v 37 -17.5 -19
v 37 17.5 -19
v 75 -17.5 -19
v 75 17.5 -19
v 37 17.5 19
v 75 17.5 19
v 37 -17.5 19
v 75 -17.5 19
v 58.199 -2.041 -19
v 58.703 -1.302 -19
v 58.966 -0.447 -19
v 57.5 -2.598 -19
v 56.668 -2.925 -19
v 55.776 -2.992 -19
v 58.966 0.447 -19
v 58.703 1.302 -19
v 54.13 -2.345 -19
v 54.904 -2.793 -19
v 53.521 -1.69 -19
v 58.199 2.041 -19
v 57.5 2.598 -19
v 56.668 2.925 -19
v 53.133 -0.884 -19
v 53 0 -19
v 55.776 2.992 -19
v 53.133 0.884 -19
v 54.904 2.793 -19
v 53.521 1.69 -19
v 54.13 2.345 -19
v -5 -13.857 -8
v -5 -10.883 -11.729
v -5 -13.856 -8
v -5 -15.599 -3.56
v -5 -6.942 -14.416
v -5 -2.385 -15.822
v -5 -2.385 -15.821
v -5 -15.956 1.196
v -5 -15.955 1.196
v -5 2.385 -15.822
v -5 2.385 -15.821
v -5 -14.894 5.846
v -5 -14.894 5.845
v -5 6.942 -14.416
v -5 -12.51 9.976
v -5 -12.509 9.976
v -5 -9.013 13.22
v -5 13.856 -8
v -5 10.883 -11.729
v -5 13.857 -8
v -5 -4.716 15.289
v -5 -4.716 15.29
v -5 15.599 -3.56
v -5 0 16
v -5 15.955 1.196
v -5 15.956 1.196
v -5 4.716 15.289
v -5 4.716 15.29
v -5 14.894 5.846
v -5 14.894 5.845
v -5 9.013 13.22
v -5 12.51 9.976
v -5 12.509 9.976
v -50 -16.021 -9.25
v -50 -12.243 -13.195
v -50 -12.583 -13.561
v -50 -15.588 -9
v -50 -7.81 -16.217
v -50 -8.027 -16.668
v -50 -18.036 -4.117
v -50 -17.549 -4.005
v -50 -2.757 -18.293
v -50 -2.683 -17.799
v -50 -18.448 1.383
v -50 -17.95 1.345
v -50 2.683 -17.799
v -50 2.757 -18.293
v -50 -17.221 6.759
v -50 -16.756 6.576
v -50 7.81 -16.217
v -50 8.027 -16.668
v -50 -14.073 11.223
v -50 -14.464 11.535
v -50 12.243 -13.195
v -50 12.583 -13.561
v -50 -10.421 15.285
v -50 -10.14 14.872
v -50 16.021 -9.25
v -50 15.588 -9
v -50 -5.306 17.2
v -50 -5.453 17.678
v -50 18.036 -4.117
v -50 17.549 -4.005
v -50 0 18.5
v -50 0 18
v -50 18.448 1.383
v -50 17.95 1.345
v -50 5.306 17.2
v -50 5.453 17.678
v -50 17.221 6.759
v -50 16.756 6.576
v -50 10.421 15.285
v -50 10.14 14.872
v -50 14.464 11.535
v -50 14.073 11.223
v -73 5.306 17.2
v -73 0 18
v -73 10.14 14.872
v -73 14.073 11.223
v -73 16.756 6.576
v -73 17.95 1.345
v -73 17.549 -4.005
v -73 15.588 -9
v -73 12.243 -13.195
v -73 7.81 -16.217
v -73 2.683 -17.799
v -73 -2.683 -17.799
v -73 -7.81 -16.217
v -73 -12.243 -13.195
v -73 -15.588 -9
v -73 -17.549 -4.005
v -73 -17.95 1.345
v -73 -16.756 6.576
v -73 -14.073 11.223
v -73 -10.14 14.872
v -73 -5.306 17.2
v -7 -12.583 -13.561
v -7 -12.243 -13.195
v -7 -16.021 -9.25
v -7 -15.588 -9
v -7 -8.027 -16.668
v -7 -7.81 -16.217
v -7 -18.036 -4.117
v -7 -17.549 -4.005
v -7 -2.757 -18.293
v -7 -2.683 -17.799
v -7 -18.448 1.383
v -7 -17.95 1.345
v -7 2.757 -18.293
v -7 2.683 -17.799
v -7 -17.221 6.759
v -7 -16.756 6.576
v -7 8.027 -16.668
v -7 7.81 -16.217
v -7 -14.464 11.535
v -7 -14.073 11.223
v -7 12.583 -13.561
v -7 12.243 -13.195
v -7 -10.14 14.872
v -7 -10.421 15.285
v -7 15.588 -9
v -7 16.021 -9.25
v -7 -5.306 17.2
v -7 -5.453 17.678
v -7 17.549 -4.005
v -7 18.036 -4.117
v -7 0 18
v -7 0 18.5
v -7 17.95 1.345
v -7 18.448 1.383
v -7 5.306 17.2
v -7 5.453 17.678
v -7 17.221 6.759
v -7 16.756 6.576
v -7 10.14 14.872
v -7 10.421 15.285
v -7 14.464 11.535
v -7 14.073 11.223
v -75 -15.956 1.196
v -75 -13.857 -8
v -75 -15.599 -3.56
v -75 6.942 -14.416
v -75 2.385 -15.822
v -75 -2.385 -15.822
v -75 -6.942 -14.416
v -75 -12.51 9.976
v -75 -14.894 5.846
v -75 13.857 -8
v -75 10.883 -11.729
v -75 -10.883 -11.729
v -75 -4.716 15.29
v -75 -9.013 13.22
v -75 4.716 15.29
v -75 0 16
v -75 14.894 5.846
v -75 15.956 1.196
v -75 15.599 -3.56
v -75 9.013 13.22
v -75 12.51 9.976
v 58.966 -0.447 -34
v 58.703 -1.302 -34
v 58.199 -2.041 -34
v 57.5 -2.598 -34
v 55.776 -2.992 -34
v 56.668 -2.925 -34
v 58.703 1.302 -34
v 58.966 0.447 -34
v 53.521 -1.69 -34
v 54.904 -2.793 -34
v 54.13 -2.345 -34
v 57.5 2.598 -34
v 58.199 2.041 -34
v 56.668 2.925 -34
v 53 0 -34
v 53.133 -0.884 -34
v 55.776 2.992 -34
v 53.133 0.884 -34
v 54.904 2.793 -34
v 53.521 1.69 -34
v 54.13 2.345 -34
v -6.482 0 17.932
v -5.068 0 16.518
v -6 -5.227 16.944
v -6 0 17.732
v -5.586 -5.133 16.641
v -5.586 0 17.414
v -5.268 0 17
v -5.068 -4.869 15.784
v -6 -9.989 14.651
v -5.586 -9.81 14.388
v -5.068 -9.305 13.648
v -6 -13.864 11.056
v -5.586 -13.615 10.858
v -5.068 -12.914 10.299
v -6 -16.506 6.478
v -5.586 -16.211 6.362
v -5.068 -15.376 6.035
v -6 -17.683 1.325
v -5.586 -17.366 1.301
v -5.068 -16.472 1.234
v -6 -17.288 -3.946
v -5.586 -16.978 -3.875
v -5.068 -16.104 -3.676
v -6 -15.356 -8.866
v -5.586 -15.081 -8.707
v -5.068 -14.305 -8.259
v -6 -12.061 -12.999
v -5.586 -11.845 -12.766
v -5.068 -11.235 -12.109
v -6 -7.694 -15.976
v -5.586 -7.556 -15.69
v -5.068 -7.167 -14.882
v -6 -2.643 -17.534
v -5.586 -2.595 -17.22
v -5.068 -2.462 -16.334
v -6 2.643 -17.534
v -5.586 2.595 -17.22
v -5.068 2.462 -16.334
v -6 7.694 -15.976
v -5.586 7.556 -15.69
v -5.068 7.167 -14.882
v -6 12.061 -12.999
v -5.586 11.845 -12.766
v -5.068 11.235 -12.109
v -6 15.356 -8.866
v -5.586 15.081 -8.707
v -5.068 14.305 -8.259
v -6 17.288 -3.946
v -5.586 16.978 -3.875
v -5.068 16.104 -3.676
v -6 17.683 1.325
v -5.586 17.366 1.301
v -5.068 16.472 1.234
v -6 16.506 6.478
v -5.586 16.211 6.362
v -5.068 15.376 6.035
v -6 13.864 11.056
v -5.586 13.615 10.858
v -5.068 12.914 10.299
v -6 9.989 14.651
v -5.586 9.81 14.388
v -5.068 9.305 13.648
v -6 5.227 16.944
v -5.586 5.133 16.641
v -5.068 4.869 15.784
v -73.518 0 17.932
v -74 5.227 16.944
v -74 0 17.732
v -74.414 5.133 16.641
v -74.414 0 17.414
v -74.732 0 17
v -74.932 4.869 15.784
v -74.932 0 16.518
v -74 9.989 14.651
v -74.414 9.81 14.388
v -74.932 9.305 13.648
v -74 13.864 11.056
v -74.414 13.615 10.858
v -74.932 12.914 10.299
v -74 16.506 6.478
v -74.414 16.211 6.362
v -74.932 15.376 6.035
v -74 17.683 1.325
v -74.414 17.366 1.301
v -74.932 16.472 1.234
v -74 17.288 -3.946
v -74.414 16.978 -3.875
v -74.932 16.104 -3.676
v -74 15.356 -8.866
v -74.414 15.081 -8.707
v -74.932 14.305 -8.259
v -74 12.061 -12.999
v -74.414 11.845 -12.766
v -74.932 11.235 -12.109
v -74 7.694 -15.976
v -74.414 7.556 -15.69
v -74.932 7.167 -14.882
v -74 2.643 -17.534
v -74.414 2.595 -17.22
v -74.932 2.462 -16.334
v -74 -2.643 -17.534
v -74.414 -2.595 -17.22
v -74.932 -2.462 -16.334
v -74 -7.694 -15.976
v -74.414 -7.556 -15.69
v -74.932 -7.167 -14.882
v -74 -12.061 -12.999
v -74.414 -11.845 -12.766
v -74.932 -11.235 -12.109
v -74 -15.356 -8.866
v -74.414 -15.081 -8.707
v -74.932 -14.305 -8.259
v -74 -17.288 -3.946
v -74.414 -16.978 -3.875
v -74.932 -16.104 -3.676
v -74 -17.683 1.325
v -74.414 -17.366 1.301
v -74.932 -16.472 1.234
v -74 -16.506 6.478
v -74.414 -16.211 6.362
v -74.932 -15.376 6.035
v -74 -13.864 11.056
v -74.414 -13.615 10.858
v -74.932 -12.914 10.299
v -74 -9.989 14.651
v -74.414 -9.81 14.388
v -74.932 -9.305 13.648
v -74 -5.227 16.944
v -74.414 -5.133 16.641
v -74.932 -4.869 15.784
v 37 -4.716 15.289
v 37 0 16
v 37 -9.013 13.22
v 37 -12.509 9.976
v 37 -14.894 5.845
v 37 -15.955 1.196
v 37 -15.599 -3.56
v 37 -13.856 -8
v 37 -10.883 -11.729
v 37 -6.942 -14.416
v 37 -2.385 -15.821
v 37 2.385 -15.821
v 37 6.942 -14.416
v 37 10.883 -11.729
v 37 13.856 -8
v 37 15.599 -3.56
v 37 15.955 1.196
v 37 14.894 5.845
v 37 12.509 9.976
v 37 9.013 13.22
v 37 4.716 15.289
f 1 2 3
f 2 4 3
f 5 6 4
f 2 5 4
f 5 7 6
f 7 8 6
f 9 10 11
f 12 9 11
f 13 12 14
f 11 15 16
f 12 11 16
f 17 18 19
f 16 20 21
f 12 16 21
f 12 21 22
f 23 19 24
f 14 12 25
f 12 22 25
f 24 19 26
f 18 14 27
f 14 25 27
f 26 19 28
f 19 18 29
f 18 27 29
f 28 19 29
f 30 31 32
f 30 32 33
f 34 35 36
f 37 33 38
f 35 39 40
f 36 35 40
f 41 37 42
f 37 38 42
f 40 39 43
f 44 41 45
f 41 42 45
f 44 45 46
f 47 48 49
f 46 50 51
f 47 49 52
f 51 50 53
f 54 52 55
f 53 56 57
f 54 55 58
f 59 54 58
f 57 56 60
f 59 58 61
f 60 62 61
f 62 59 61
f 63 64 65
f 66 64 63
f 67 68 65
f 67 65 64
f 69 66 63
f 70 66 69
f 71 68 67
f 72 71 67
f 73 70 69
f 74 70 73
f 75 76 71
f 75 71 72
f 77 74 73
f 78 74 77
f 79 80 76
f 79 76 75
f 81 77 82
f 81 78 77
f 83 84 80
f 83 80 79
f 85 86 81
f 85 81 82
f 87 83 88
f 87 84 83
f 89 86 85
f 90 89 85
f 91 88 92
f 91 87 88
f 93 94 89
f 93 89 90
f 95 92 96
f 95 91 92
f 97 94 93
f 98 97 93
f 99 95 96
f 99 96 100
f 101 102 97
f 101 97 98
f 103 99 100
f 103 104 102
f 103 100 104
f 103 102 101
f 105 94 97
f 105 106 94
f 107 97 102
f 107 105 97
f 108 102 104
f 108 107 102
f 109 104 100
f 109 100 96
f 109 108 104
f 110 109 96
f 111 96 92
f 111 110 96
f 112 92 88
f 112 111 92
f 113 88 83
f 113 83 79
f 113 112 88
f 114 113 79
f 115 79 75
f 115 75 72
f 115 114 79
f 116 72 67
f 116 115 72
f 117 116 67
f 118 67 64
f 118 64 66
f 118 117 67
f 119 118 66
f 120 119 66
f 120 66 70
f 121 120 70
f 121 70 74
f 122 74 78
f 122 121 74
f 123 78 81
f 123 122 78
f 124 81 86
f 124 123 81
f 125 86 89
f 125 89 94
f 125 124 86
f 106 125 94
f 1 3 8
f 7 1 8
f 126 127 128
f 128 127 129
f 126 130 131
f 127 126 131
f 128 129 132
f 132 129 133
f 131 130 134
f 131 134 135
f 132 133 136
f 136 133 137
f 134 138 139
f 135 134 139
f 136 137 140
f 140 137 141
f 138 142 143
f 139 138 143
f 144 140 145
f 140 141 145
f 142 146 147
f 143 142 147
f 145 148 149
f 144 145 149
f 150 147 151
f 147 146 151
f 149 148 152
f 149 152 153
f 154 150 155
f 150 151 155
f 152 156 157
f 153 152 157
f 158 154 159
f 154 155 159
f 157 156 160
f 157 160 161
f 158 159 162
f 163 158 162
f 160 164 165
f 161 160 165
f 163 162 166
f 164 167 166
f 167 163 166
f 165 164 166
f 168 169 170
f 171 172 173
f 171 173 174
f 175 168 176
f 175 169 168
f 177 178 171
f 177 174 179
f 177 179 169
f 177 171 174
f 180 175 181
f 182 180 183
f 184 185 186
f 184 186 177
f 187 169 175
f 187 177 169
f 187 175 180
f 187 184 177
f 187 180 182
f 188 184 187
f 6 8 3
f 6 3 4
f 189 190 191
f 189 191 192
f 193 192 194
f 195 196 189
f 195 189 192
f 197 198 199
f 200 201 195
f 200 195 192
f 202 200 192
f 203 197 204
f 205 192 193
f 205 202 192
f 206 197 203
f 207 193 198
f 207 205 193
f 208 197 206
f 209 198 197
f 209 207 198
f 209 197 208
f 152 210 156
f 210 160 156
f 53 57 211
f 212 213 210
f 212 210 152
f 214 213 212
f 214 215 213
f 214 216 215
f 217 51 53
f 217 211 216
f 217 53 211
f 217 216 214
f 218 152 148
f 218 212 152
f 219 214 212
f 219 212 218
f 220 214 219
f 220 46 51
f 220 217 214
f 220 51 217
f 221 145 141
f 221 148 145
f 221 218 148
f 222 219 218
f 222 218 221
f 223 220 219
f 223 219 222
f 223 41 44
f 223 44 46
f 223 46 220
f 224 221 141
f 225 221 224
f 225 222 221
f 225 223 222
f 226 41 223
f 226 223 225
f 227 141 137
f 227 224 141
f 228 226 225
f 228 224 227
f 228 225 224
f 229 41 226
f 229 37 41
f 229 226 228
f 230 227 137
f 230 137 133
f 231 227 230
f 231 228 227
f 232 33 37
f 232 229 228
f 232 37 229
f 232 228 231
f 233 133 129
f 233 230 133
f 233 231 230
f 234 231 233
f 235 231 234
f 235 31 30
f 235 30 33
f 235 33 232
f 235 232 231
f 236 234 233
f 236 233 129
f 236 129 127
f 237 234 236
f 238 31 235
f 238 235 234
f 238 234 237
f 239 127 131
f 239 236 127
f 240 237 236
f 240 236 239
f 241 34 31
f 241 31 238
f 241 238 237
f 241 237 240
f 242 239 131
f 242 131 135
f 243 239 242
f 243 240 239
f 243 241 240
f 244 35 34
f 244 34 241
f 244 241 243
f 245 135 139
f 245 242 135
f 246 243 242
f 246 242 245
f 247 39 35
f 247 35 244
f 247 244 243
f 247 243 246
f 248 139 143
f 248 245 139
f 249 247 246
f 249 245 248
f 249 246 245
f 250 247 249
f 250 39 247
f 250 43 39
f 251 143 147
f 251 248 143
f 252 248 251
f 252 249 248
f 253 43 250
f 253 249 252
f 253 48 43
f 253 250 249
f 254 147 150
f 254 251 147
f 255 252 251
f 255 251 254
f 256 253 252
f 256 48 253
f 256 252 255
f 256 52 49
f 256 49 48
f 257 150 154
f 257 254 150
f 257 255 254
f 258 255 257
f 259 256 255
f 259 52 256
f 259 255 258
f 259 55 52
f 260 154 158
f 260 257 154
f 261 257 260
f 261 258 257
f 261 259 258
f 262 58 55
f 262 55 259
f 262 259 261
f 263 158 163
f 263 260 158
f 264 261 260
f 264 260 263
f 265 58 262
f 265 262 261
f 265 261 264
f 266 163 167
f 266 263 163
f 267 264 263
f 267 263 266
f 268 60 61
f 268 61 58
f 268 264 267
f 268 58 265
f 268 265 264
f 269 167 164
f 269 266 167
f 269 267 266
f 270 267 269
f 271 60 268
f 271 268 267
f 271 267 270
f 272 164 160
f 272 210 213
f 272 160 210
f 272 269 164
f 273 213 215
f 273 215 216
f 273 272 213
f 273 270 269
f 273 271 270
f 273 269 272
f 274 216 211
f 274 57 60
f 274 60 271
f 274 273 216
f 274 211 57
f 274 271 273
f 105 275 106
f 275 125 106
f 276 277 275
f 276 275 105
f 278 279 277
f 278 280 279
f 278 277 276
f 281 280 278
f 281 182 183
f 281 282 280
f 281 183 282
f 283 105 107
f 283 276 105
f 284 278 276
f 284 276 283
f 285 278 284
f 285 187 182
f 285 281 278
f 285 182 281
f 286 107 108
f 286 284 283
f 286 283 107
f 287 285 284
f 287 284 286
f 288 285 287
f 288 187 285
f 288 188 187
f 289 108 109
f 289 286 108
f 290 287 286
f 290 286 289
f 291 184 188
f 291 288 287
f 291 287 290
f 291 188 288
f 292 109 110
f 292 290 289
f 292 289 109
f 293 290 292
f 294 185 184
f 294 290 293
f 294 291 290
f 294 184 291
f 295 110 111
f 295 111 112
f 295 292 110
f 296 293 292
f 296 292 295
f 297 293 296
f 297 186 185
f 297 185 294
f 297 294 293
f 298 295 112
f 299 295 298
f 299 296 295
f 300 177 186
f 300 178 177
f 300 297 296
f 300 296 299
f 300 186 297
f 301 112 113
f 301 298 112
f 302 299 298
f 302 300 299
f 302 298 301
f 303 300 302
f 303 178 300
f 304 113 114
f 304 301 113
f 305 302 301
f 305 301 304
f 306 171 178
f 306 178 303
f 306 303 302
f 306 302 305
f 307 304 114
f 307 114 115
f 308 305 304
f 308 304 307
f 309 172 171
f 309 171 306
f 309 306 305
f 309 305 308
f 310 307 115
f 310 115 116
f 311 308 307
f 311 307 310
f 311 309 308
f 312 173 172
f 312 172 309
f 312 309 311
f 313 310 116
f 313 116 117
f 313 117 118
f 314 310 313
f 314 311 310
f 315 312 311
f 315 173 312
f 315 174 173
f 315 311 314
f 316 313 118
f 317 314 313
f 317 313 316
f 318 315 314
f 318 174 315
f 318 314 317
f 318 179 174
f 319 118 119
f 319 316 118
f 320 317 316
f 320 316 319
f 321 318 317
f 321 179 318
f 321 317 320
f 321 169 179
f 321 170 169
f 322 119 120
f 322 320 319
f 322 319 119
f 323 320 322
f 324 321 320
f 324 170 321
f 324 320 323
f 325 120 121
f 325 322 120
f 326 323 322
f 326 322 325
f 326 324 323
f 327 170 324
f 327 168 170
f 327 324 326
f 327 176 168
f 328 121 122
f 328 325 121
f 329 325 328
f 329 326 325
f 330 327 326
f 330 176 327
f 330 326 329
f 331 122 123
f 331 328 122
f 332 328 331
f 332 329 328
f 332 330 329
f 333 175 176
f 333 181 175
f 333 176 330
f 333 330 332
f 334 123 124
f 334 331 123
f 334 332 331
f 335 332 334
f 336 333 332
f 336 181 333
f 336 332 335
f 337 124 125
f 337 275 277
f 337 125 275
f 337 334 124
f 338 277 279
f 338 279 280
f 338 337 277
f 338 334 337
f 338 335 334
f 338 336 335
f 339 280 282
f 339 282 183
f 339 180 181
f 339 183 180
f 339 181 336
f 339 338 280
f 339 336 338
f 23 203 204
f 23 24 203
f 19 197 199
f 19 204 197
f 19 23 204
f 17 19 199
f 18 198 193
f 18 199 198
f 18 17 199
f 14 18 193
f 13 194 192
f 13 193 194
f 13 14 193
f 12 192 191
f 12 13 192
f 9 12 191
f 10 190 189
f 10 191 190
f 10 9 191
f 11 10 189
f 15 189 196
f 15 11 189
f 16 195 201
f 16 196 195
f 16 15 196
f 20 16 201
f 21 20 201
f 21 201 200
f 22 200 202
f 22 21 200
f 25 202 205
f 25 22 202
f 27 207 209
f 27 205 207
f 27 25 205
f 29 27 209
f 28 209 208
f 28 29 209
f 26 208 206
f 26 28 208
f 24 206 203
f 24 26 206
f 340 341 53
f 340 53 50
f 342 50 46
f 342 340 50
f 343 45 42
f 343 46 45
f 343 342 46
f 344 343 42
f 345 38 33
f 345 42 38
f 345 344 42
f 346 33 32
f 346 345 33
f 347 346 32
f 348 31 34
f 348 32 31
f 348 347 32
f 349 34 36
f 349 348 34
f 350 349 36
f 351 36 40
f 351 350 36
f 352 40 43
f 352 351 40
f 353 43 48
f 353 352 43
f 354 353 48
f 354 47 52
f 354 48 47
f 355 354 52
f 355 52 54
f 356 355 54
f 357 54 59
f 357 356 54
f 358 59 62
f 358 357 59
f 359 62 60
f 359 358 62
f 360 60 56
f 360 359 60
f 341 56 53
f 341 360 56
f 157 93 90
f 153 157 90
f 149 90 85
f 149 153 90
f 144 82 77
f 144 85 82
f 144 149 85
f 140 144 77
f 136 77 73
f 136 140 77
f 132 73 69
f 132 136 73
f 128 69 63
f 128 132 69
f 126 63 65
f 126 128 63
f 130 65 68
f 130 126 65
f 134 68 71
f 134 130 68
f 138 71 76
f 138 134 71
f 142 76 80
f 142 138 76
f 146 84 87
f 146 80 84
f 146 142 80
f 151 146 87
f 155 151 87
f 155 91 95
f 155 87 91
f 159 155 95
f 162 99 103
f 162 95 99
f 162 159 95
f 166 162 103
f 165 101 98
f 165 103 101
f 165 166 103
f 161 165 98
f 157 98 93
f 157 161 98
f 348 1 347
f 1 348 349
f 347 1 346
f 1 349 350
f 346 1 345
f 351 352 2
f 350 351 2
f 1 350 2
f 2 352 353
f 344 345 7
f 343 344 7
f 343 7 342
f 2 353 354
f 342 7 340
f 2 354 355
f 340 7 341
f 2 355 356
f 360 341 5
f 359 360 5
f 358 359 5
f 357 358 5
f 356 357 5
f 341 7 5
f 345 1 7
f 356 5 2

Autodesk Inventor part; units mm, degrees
ref_plane "YZ Plane" through (0, 0, 0) normal (1, 0, 0) x (0, 1, 0)
ref_plane "XZ Plane" through (0, 0, 0) normal (0, 1, 0) x (-1, 0, 0)
sketch "Sketch1" plane through (0, 0, 0) normal (0, 0, 1) x (1, 0, 0)
  line L0 (-75, 0) -> (75, 0)
  line L1 (-105, 0) -> (105, 0) projected
  point P0 (0, 0)
  dimension "d0" = 150
  dimension "d1" = 75
ref_plane "Work Plane1" through (75, 0, 0) normal (1, 0, 0) x (0, 1, 0)
sketch "Sketch2" plane through (75, 0, 0) normal (1, 0, 0) x (0, 1, 0)
  line L0 (-17.5, 19) -> (17.5, 19)
  line L1 (17.5, 19) -> (17.5, -19)
  line L2 (17.5, -19) -> (-17.5, -19)
  line L3 (-17.5, -19) -> (-17.5, 19)
  line L4 (-17.5, 19) -> (17.5, -19) construction
  line L5 (17.5, 19) -> (-17.5, -19) construction
  point P0 (0, 0)
  dimension "d2" = 35
  dimension "d3" = 38
extrude "Extrusion1" add sketch "Sketch2" against normal blind 38
sketch "Sketch3" plane through (37, 0, 0) normal (-1, 0, 0) x (0, 0, 1)
  circle A0 centre (0, 0) radius 16
  dimension "d6" = 32
extrude "Extrusion2" add sketch "Sketch3" along normal blind 42
sketch "Sketch4" plane through (-5, 0, 0) normal (-1, 0, 0) x (0, 0, 1)
  circle A0 centre (0, 0) radius 18
  dimension "d9" = 36
extrude "Extrusion3" add sketch "Sketch4" along normal blind 2
sketch "Sketch5" plane through (-7, 0, 0) normal (-1, 0, 0) x (0, 0, 1)
  circle A0 centre (0, 0) radius 18.5
  dimension "d12" = 37
extrude "Extrusion4" add sketch "Sketch5" along normal blind 68
sketch "Sketch6" plane through (-75, 0, 0) normal (-1, 0, 0) x (0, 0, 1)
  circle A0 centre (0, 0) radius 18
  circle A1 centre (0, 0) radius 18.5
  dimension "d15" = 36
  dimension "d16" = 37
extrude "Extrusion5" cut sketch "Sketch6" against normal blind 25
fillet "Fillet1" radius 2 2 edges at (-75, 0, -18) (-5, 0, -18)
sketch "Sketch7" plane through (75, -17.5, -19) normal (0, 0, -1) x (-1, 0, 0)
  circle A0 centre (19, 17.5) radius 3
  line L0 (0, 35) -> (38, 35) projected
  line L1 (0, 0) -> (0, 35) projected
  point P0 (75, 17.5)
  dimension "d20" = 6
  dimension "d21" = 17.5
  dimension "d22" = 19
extrude "Extrusion6" add sketch "Sketch7" along normal blind 15 separate body
properties part number "WristMotor"
